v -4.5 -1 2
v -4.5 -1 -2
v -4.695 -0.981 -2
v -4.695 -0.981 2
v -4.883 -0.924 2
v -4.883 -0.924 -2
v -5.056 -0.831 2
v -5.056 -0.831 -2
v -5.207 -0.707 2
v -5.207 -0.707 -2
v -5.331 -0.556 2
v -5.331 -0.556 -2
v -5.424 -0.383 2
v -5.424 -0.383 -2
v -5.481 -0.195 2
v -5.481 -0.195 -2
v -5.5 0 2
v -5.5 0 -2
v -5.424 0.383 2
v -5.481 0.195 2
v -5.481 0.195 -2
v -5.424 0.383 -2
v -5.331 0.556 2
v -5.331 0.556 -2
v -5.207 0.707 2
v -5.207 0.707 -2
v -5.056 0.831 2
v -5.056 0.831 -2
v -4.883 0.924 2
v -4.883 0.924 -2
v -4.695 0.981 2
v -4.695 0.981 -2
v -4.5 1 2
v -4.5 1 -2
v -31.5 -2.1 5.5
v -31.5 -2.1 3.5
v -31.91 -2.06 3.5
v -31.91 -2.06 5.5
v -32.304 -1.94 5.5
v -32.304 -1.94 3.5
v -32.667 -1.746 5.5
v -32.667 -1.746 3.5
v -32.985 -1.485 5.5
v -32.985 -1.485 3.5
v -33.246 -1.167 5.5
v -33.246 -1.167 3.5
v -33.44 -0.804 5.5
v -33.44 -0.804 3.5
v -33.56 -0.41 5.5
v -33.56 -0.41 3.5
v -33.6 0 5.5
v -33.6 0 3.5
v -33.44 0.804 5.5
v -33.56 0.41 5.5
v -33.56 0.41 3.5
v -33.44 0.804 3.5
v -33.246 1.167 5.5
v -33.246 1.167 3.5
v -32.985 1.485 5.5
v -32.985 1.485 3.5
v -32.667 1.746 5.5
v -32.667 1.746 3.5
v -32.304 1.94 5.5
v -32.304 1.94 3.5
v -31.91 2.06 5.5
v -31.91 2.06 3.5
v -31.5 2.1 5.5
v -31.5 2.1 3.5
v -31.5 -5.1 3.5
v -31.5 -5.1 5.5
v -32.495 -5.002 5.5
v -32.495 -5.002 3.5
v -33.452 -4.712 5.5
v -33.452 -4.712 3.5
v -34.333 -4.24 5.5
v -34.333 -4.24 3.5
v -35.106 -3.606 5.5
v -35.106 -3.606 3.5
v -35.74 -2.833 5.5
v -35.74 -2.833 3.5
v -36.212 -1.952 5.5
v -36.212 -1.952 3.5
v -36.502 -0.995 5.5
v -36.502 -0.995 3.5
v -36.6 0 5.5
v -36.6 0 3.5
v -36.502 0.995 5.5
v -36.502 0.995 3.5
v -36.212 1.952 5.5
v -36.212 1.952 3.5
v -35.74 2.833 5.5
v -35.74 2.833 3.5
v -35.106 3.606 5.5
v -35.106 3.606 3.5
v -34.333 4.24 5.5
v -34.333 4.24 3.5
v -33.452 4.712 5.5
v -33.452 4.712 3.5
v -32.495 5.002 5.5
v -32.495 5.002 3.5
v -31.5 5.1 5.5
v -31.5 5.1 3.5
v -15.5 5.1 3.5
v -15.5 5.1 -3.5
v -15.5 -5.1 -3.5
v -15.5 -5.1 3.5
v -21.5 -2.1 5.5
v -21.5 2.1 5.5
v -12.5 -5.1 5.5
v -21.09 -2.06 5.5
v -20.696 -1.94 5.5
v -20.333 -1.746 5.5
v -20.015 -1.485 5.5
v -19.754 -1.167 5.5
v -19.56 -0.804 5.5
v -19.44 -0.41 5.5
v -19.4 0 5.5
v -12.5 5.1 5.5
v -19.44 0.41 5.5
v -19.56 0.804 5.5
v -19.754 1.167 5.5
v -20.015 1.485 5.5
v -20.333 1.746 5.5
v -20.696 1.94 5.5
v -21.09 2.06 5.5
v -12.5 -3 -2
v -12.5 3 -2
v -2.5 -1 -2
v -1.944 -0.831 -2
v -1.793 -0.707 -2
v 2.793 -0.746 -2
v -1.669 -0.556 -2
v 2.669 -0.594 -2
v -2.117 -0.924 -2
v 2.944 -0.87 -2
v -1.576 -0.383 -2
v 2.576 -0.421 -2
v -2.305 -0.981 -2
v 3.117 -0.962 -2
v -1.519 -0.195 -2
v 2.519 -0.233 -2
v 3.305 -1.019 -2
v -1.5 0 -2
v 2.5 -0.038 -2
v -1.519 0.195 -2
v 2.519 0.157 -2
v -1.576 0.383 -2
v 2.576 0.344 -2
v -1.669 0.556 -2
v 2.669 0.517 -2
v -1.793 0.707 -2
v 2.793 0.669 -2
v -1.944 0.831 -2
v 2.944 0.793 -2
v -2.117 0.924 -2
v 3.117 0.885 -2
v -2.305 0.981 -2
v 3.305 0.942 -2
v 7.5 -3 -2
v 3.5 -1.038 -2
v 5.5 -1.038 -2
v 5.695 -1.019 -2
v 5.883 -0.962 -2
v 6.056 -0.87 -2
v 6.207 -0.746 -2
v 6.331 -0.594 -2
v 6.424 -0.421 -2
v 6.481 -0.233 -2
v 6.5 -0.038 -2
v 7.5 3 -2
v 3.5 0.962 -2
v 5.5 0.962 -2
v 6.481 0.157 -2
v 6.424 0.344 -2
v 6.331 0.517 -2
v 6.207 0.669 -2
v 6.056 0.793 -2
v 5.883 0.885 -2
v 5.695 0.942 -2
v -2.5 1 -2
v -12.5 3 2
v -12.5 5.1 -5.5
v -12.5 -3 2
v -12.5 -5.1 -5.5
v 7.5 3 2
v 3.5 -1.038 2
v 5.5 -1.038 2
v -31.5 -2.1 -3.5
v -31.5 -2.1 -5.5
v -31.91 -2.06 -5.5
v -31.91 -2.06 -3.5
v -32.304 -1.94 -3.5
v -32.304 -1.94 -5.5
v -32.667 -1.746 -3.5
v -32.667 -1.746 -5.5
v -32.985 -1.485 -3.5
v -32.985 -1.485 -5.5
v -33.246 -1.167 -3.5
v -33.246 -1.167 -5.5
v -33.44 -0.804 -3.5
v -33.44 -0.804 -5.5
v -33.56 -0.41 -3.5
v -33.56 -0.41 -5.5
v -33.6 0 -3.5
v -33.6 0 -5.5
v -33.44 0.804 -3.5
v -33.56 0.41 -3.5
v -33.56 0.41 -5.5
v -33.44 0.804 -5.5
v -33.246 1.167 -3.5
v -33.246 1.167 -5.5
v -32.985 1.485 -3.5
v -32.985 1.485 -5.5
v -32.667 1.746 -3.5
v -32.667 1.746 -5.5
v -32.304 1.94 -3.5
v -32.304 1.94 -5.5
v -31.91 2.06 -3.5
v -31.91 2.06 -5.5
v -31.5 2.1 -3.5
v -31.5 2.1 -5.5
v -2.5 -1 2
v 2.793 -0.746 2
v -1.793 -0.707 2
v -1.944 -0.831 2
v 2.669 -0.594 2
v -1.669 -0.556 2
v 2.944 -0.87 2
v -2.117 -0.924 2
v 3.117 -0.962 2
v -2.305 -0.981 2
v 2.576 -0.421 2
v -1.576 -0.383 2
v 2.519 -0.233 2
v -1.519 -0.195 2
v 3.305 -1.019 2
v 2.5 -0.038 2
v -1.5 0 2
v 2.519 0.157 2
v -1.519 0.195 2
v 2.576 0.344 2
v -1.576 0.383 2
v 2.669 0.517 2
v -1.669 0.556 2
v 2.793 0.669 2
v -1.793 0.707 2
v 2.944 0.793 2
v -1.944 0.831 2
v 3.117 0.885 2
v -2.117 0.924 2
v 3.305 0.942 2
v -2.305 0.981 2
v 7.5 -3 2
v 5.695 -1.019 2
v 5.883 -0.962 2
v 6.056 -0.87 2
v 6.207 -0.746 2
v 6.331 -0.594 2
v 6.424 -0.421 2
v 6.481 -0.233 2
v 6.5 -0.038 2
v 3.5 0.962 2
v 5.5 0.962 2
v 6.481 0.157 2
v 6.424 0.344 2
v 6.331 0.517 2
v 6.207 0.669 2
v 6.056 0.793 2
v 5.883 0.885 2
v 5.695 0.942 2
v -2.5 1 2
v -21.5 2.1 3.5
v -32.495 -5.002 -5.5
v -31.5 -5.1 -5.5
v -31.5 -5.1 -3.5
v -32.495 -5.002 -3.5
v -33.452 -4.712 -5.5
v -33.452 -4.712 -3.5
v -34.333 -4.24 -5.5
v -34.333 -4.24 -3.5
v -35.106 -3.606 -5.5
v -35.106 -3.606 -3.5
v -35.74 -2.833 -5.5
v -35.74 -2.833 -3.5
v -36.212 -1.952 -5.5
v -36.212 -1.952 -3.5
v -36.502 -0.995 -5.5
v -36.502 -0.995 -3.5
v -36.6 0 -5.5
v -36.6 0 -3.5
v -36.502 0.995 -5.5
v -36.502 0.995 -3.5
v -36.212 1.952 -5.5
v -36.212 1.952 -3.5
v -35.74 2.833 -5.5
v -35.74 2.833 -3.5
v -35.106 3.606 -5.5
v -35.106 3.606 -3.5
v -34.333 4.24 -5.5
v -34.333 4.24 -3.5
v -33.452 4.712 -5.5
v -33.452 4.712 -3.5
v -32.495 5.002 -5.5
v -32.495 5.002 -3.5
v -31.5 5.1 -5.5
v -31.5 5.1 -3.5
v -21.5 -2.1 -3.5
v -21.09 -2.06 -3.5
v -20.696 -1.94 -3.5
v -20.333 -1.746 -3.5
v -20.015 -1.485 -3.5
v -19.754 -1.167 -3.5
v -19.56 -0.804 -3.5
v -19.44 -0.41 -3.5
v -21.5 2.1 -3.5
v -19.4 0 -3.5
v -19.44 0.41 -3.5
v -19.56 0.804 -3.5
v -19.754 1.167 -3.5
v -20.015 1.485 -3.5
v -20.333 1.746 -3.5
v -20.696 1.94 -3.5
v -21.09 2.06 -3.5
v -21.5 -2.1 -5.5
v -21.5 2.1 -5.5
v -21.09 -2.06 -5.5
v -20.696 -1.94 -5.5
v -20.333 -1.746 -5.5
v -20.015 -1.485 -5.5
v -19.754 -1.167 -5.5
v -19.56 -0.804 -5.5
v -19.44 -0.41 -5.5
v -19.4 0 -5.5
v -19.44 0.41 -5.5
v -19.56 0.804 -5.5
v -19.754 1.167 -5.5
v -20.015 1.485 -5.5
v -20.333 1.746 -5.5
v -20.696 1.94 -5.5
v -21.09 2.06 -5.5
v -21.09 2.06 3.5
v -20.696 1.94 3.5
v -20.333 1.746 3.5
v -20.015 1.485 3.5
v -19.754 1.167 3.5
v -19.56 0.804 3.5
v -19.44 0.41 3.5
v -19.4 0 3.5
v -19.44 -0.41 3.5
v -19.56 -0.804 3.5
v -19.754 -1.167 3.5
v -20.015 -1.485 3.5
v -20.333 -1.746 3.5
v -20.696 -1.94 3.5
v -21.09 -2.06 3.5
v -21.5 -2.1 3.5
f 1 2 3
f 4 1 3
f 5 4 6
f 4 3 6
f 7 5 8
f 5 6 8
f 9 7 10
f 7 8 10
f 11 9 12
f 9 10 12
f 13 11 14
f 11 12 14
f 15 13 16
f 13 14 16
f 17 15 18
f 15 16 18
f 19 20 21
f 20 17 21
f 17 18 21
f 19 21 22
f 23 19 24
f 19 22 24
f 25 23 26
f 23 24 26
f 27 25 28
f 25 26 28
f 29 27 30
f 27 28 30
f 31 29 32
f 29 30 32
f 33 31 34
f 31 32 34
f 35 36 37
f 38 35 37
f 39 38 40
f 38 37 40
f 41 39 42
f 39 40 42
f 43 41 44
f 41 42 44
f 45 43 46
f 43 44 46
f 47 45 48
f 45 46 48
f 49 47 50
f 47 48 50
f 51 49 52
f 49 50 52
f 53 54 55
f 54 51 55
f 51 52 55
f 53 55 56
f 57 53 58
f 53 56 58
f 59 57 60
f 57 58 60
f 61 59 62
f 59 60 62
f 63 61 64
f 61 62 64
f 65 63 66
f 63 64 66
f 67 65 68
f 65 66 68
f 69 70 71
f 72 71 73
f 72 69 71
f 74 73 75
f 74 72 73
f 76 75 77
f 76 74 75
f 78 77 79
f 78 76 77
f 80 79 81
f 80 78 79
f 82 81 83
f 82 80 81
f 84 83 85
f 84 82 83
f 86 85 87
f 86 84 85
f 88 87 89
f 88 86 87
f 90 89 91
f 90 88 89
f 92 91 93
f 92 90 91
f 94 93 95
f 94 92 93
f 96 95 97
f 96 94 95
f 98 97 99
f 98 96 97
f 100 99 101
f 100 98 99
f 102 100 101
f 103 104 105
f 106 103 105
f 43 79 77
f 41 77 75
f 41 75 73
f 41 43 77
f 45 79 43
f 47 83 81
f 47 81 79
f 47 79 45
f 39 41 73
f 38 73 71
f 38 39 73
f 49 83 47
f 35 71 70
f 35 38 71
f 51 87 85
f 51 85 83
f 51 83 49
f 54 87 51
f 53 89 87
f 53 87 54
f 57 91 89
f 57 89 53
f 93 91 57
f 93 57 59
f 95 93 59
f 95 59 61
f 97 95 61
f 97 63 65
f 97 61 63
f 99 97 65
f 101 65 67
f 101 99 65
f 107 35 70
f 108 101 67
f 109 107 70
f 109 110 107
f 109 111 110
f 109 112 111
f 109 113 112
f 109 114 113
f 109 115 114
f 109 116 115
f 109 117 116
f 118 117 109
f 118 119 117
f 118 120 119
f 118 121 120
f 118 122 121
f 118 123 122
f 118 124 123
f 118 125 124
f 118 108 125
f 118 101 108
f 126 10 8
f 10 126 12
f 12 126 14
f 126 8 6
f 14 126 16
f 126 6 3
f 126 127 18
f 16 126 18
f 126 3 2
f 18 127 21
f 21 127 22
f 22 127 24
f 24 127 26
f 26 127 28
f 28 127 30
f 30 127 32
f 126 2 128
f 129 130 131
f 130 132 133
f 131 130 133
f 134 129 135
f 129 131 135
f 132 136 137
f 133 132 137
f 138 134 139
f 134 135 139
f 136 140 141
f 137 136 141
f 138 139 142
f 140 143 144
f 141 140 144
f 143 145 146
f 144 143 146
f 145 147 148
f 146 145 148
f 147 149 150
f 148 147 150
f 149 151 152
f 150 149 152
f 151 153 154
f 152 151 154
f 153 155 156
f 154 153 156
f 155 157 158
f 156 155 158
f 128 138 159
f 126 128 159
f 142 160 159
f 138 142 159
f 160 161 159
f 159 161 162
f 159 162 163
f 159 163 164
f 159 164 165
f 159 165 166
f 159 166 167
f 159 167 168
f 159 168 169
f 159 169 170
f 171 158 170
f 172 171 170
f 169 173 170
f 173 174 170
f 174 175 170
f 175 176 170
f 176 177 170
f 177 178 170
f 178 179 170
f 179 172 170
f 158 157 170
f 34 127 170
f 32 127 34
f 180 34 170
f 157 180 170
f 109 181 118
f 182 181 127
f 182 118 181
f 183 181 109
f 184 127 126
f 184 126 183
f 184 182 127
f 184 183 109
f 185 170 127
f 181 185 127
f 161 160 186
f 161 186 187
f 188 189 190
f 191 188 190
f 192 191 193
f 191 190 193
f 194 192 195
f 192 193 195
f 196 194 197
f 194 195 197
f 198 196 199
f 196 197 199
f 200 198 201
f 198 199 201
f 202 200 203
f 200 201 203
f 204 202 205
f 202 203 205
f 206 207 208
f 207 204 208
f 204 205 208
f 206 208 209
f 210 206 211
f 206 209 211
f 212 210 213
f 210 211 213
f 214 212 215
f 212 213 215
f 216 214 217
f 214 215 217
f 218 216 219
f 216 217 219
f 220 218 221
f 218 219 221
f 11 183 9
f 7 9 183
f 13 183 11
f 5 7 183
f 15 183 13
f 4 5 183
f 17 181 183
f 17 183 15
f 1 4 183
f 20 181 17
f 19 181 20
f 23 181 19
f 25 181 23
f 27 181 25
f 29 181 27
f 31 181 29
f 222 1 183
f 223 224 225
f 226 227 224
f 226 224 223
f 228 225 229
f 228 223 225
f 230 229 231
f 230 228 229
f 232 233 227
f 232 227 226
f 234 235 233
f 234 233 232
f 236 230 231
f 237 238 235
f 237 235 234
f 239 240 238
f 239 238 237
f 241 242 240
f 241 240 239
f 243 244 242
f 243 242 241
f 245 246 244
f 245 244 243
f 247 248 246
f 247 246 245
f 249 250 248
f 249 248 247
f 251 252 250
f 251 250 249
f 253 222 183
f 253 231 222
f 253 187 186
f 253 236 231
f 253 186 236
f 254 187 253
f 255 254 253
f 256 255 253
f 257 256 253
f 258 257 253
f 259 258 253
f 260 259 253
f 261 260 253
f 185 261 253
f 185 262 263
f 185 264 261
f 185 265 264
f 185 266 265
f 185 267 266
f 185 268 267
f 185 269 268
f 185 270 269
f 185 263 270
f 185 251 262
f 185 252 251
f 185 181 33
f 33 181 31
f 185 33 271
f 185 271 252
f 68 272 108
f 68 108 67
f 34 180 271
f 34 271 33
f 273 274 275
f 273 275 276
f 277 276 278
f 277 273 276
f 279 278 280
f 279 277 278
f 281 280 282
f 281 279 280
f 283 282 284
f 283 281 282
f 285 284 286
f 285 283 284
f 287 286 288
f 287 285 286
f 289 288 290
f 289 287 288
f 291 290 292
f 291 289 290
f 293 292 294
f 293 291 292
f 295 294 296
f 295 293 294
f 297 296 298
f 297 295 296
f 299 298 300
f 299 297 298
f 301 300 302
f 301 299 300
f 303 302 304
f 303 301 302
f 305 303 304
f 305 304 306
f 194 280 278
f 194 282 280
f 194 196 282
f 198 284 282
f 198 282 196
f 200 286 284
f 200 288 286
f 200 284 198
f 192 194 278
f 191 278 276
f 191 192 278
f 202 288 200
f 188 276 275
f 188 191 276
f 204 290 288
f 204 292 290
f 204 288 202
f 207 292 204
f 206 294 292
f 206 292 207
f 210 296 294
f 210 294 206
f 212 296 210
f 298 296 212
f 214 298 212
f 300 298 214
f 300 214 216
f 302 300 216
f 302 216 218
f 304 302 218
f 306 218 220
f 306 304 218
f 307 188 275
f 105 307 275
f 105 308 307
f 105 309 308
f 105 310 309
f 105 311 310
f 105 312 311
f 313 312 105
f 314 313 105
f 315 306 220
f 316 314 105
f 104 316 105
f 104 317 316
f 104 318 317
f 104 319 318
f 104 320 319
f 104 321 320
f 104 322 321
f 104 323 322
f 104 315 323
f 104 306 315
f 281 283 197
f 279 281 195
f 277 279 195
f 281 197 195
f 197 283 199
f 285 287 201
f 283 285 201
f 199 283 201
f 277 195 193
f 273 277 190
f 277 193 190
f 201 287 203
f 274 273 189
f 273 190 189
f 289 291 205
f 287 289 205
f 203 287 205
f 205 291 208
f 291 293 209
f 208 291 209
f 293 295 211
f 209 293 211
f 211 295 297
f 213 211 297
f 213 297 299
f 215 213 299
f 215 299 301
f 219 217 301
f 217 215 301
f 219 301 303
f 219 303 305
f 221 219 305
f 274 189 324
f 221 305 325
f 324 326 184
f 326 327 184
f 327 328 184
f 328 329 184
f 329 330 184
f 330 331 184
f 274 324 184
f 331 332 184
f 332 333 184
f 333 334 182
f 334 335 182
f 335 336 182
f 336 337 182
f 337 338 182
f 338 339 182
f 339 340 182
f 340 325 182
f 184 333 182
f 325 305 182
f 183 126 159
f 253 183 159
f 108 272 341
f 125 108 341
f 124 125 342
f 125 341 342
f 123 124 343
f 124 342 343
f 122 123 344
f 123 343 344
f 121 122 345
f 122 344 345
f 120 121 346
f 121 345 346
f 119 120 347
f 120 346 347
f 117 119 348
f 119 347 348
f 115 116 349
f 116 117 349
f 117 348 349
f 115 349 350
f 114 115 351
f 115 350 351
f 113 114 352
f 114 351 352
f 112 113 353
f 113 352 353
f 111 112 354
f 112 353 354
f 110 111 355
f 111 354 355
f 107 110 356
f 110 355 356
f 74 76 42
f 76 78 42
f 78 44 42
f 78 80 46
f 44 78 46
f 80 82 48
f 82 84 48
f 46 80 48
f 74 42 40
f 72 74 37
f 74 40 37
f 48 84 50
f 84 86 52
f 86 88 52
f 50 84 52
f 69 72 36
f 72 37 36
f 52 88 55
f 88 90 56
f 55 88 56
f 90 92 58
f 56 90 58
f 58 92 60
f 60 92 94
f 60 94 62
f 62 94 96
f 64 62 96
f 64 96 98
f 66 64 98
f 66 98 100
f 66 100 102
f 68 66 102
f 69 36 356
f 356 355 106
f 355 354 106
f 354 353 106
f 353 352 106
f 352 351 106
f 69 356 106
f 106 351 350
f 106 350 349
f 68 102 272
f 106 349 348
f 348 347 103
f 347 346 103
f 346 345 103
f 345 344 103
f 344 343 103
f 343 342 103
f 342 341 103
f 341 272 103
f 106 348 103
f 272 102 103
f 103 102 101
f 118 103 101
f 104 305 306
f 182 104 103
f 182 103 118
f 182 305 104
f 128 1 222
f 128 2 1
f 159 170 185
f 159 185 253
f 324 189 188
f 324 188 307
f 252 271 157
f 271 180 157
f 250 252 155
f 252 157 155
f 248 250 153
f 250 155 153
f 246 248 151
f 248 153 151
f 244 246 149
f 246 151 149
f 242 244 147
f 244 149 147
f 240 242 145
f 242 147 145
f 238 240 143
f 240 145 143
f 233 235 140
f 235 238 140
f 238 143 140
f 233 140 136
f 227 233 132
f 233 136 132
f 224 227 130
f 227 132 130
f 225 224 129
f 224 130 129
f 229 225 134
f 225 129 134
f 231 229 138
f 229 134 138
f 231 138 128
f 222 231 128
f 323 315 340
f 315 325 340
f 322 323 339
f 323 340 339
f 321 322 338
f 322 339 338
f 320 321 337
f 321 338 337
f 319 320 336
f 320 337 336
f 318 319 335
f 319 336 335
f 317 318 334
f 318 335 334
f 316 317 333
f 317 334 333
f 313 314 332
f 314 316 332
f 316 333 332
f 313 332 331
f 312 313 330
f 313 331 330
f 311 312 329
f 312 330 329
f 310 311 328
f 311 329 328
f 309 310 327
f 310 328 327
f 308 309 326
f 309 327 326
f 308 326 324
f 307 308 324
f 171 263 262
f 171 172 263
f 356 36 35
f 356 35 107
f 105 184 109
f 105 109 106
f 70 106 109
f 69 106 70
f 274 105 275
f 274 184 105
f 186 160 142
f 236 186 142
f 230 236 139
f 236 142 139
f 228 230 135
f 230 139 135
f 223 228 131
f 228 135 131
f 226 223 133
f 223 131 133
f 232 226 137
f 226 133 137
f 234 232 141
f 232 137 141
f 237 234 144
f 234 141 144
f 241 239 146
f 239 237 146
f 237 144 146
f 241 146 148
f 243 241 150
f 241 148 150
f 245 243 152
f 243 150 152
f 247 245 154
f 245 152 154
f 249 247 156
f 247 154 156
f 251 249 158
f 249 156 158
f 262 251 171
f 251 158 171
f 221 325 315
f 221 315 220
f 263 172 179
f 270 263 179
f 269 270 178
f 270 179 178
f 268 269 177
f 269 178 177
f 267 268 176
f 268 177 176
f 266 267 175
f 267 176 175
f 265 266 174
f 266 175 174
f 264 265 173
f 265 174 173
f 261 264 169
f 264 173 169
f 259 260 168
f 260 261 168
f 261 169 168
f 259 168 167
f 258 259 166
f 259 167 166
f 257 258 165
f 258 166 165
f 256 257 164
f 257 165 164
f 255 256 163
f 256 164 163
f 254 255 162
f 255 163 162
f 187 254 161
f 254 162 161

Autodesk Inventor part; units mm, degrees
ref_plane "YZ Plane" through (0, 0, 0) normal (1, 0, 0) x (0, 1, 0)
ref_plane "XZ Plane" through (0, 0, 0) normal (0, 1, 0) x (-1, 0, 0)
ref_plane "XY Plane" through (0, 0, 0) normal (0, 0, 1) x (1, 0, 0)
sketch "草圖17" plane through (0, 0, 0) normal (0, 0, 1) x (1, 0, 0)
  line L0 (-12.5, -3) -> (12.5, -3)
  line L1 (12.5, -3) -> (12.5, 3)
  line L2 (12.5, 3) -> (-12.5, 3)
  line L3 (-12.5, 3) -> (-12.5, -3)
  line L4 (-12.5, -3) -> (12.5, 3) construction
  line L5 (12.5, -3) -> (-12.5, 3) construction
  line L6 (0, 0) -> (-6.6625, 0) construction
  circle A0 centre (9.5, 0) radius 2
  line L7 (-2.5, 0) -> (-4.5, 0) construction
  line L8 (-2.5, 1) -> (-4.5, 1)
  line L9 (-4.5, -1) -> (-2.5, -1)
  arc A1 (-2.5, -1) -> (-2.5, 1) centre (-2.5, 0) ccw
  arc A2 (-4.5, 1) -> (-4.5, -1) centre (-4.5, 0) ccw
  line L10 (5.5, -0.0384) -> (3.5, -0.0384) construction
  line L11 (5.5, 0.9616) -> (3.5, 0.9616)
  line L12 (3.5, -1.0384) -> (5.5, -1.0384)
  arc A3 (5.5, -1.0384) -> (5.5, 0.9616) centre (5.5, -0.0384) ccw
  arc A4 (3.5, 0.9616) -> (3.5, -1.0384) centre (3.5, -0.0384) ccw
  line L13 (7.5, 3) -> (7.5, -3)
  point P0 (-3.5, 0)
  point P1 (4.5, -0.0384)
  dimension "d166" = 25
  dimension "d167" = 6
  dimension "d170" = 4
  dimension "d171" = 3
  dimension "d173" = 2
  dimension "d174" = 12
  dimension "d175" = 2
  dimension "d190" = 4
  dimension "d191" = 2
  dimension "d192" = 2
extrude "擠出18" add sketch "草圖17" along normal mid plane 4 contours L3 L2 L13 L0
sketch "草圖18" plane through (0, 0, 0) normal (0, 0, 1) x (1, 0, 0)
  line L0 (7.5, -3) -> (-12.5, -3) projected
  line L1 (-12.5, -3) -> (-12.5, 3) projected
  line L2 (-12.5, 3) -> (7.5, 3) projected
  arc A0 (-2.5, -1) -> (-2.5, 1) centre (-2.5, 0) ccw projected
  line L3 (-2.5, 1) -> (-4.5, 1) projected
  arc A1 (-4.5, 1) -> (-4.5, -1) centre (-4.5, 0) ccw projected
  line L4 (-4.5, -1) -> (-2.5, -1) projected
  line L5 (-12.5, -5.1) -> (-21.5, -5.1)
  line L6 (-21.5, -5.1) -> (-21.5, 5.1)
  line L7 (-21.5, 5.1) -> (-12.5, 5.1)
  line L8 (-12.5, 5.1) -> (-12.5, -5.1)
  line L9 (-12.5, -5.1) -> (-21.5, 5.1) construction
  line L10 (-21.5, -5.1) -> (-12.5, 5.1) construction
  arc A2 (-2.5, -1) -> (-2.5, 1) centre (-2.5, 0) ccw construction
  line L11 (-2.5, 0) -> (-4.5, 0) construction
  line L12 (-21.5, 0) -> (-31.5, 0) construction
  line L13 (-21.5, 2.1) -> (-31.5, 2.1)
  line L14 (-31.5, -2.1) -> (-21.5, -2.1)
  arc A3 (-21.5, -2.1) -> (-21.5, 2.1) centre (-21.5, 0) ccw
  arc A4 (-31.5, 2.1) -> (-31.5, -2.1) centre (-31.5, 0) ccw
  line L15 (-31.5, 5.1) -> (-21.5, 5.1)
  arc A5 (-21.5, -5.1) -> (-21.5, 5.1) centre (-21.5, 0) ccw
  line L16 (-21.5, -5.1) -> (-31.5, -5.1)
  arc A6 (-31.5, 5.1) -> (-31.5, -5.1) centre (-31.5, 0) ccw
  line L17 (-12.5, -3) -> (-12.5, 3) construction
  line L18 (7.5, 3) -> (7.5, -3) projected
  point P0 (0, 0)
  point P1 (-17, 0)
  point P2 (-26.5, 0)
  dimension "d181" = 2.1
  dimension "d182" = 10
  dimension "d183" = 3
  dimension "d189" = 9
extrude "擠出19" add sketch "草圖18" along normal mid plane 11 contours L8 L5 A5 L7 L1 | L16 A6 L15 L6 L13 A4 L14 | L6 A3 A5
sketch "草圖19" plane through (0, 0, 0) normal (0, 0, 1) x (1, 0, 0)
  arc A0 (-31.5, 5.1) -> (-31.5, -5.1) centre (-31.5, 0) ccw projected
  line L0 (-31.5, 5.1) -> (-12.5, 5.1) projected
  line L1 (-12.5, 5.1) -> (-12.5, -5.1) projected
  line L2 (-12.5, -5.1) -> (-31.5, -5.1) projected
  arc A1 (-21.5, -2.1) -> (-21.5, 2.1) centre (-21.5, 0) ccw projected
  line L3 (-21.5, 2.1) -> (-31.5, 2.1) projected
  arc A2 (-31.5, 2.1) -> (-31.5, -2.1) centre (-31.5, 0) ccw projected
  line L4 (-31.5, -2.1) -> (-21.5, -2.1) projected
  line L5 (-15.5, -5.1) -> (-45.605, -5.1)
  line L6 (-45.605, -5.1) -> (-45.605, 5.1)
  line L7 (-45.605, 5.1) -> (-15.5, 5.1)
  line L8 (-15.5, 5.1) -> (-15.5, -5.1)
  line L9 (-31.5, 5.1) -> (-12.5, 5.1) projected
  point P0 (0, 0)
  point P1 (-15.5, 5.1)
  dimension "d186" = 3
extrude "擠出20" cut sketch "草圖19" along normal mid plane 7 contours L0 L8 L2 A0 | A0 L5 L6 L7
sketch "草圖20" plane through (7.5, 3, 2) normal (0, 1, 0) x (1, 0, 0)
  line L0 (0, 0) -> (-20, 0) projected
  line L1 (-20, 0) -> (0, 0)
  line L2 (0, 4) -> (0, 0) projected
  point P0 (-7.5, 2)
  dimension "d193" = 20
  dimension "d194" = 0
extrude "擠出21" [suppressed]
properties part number "fan_holder_0301"
